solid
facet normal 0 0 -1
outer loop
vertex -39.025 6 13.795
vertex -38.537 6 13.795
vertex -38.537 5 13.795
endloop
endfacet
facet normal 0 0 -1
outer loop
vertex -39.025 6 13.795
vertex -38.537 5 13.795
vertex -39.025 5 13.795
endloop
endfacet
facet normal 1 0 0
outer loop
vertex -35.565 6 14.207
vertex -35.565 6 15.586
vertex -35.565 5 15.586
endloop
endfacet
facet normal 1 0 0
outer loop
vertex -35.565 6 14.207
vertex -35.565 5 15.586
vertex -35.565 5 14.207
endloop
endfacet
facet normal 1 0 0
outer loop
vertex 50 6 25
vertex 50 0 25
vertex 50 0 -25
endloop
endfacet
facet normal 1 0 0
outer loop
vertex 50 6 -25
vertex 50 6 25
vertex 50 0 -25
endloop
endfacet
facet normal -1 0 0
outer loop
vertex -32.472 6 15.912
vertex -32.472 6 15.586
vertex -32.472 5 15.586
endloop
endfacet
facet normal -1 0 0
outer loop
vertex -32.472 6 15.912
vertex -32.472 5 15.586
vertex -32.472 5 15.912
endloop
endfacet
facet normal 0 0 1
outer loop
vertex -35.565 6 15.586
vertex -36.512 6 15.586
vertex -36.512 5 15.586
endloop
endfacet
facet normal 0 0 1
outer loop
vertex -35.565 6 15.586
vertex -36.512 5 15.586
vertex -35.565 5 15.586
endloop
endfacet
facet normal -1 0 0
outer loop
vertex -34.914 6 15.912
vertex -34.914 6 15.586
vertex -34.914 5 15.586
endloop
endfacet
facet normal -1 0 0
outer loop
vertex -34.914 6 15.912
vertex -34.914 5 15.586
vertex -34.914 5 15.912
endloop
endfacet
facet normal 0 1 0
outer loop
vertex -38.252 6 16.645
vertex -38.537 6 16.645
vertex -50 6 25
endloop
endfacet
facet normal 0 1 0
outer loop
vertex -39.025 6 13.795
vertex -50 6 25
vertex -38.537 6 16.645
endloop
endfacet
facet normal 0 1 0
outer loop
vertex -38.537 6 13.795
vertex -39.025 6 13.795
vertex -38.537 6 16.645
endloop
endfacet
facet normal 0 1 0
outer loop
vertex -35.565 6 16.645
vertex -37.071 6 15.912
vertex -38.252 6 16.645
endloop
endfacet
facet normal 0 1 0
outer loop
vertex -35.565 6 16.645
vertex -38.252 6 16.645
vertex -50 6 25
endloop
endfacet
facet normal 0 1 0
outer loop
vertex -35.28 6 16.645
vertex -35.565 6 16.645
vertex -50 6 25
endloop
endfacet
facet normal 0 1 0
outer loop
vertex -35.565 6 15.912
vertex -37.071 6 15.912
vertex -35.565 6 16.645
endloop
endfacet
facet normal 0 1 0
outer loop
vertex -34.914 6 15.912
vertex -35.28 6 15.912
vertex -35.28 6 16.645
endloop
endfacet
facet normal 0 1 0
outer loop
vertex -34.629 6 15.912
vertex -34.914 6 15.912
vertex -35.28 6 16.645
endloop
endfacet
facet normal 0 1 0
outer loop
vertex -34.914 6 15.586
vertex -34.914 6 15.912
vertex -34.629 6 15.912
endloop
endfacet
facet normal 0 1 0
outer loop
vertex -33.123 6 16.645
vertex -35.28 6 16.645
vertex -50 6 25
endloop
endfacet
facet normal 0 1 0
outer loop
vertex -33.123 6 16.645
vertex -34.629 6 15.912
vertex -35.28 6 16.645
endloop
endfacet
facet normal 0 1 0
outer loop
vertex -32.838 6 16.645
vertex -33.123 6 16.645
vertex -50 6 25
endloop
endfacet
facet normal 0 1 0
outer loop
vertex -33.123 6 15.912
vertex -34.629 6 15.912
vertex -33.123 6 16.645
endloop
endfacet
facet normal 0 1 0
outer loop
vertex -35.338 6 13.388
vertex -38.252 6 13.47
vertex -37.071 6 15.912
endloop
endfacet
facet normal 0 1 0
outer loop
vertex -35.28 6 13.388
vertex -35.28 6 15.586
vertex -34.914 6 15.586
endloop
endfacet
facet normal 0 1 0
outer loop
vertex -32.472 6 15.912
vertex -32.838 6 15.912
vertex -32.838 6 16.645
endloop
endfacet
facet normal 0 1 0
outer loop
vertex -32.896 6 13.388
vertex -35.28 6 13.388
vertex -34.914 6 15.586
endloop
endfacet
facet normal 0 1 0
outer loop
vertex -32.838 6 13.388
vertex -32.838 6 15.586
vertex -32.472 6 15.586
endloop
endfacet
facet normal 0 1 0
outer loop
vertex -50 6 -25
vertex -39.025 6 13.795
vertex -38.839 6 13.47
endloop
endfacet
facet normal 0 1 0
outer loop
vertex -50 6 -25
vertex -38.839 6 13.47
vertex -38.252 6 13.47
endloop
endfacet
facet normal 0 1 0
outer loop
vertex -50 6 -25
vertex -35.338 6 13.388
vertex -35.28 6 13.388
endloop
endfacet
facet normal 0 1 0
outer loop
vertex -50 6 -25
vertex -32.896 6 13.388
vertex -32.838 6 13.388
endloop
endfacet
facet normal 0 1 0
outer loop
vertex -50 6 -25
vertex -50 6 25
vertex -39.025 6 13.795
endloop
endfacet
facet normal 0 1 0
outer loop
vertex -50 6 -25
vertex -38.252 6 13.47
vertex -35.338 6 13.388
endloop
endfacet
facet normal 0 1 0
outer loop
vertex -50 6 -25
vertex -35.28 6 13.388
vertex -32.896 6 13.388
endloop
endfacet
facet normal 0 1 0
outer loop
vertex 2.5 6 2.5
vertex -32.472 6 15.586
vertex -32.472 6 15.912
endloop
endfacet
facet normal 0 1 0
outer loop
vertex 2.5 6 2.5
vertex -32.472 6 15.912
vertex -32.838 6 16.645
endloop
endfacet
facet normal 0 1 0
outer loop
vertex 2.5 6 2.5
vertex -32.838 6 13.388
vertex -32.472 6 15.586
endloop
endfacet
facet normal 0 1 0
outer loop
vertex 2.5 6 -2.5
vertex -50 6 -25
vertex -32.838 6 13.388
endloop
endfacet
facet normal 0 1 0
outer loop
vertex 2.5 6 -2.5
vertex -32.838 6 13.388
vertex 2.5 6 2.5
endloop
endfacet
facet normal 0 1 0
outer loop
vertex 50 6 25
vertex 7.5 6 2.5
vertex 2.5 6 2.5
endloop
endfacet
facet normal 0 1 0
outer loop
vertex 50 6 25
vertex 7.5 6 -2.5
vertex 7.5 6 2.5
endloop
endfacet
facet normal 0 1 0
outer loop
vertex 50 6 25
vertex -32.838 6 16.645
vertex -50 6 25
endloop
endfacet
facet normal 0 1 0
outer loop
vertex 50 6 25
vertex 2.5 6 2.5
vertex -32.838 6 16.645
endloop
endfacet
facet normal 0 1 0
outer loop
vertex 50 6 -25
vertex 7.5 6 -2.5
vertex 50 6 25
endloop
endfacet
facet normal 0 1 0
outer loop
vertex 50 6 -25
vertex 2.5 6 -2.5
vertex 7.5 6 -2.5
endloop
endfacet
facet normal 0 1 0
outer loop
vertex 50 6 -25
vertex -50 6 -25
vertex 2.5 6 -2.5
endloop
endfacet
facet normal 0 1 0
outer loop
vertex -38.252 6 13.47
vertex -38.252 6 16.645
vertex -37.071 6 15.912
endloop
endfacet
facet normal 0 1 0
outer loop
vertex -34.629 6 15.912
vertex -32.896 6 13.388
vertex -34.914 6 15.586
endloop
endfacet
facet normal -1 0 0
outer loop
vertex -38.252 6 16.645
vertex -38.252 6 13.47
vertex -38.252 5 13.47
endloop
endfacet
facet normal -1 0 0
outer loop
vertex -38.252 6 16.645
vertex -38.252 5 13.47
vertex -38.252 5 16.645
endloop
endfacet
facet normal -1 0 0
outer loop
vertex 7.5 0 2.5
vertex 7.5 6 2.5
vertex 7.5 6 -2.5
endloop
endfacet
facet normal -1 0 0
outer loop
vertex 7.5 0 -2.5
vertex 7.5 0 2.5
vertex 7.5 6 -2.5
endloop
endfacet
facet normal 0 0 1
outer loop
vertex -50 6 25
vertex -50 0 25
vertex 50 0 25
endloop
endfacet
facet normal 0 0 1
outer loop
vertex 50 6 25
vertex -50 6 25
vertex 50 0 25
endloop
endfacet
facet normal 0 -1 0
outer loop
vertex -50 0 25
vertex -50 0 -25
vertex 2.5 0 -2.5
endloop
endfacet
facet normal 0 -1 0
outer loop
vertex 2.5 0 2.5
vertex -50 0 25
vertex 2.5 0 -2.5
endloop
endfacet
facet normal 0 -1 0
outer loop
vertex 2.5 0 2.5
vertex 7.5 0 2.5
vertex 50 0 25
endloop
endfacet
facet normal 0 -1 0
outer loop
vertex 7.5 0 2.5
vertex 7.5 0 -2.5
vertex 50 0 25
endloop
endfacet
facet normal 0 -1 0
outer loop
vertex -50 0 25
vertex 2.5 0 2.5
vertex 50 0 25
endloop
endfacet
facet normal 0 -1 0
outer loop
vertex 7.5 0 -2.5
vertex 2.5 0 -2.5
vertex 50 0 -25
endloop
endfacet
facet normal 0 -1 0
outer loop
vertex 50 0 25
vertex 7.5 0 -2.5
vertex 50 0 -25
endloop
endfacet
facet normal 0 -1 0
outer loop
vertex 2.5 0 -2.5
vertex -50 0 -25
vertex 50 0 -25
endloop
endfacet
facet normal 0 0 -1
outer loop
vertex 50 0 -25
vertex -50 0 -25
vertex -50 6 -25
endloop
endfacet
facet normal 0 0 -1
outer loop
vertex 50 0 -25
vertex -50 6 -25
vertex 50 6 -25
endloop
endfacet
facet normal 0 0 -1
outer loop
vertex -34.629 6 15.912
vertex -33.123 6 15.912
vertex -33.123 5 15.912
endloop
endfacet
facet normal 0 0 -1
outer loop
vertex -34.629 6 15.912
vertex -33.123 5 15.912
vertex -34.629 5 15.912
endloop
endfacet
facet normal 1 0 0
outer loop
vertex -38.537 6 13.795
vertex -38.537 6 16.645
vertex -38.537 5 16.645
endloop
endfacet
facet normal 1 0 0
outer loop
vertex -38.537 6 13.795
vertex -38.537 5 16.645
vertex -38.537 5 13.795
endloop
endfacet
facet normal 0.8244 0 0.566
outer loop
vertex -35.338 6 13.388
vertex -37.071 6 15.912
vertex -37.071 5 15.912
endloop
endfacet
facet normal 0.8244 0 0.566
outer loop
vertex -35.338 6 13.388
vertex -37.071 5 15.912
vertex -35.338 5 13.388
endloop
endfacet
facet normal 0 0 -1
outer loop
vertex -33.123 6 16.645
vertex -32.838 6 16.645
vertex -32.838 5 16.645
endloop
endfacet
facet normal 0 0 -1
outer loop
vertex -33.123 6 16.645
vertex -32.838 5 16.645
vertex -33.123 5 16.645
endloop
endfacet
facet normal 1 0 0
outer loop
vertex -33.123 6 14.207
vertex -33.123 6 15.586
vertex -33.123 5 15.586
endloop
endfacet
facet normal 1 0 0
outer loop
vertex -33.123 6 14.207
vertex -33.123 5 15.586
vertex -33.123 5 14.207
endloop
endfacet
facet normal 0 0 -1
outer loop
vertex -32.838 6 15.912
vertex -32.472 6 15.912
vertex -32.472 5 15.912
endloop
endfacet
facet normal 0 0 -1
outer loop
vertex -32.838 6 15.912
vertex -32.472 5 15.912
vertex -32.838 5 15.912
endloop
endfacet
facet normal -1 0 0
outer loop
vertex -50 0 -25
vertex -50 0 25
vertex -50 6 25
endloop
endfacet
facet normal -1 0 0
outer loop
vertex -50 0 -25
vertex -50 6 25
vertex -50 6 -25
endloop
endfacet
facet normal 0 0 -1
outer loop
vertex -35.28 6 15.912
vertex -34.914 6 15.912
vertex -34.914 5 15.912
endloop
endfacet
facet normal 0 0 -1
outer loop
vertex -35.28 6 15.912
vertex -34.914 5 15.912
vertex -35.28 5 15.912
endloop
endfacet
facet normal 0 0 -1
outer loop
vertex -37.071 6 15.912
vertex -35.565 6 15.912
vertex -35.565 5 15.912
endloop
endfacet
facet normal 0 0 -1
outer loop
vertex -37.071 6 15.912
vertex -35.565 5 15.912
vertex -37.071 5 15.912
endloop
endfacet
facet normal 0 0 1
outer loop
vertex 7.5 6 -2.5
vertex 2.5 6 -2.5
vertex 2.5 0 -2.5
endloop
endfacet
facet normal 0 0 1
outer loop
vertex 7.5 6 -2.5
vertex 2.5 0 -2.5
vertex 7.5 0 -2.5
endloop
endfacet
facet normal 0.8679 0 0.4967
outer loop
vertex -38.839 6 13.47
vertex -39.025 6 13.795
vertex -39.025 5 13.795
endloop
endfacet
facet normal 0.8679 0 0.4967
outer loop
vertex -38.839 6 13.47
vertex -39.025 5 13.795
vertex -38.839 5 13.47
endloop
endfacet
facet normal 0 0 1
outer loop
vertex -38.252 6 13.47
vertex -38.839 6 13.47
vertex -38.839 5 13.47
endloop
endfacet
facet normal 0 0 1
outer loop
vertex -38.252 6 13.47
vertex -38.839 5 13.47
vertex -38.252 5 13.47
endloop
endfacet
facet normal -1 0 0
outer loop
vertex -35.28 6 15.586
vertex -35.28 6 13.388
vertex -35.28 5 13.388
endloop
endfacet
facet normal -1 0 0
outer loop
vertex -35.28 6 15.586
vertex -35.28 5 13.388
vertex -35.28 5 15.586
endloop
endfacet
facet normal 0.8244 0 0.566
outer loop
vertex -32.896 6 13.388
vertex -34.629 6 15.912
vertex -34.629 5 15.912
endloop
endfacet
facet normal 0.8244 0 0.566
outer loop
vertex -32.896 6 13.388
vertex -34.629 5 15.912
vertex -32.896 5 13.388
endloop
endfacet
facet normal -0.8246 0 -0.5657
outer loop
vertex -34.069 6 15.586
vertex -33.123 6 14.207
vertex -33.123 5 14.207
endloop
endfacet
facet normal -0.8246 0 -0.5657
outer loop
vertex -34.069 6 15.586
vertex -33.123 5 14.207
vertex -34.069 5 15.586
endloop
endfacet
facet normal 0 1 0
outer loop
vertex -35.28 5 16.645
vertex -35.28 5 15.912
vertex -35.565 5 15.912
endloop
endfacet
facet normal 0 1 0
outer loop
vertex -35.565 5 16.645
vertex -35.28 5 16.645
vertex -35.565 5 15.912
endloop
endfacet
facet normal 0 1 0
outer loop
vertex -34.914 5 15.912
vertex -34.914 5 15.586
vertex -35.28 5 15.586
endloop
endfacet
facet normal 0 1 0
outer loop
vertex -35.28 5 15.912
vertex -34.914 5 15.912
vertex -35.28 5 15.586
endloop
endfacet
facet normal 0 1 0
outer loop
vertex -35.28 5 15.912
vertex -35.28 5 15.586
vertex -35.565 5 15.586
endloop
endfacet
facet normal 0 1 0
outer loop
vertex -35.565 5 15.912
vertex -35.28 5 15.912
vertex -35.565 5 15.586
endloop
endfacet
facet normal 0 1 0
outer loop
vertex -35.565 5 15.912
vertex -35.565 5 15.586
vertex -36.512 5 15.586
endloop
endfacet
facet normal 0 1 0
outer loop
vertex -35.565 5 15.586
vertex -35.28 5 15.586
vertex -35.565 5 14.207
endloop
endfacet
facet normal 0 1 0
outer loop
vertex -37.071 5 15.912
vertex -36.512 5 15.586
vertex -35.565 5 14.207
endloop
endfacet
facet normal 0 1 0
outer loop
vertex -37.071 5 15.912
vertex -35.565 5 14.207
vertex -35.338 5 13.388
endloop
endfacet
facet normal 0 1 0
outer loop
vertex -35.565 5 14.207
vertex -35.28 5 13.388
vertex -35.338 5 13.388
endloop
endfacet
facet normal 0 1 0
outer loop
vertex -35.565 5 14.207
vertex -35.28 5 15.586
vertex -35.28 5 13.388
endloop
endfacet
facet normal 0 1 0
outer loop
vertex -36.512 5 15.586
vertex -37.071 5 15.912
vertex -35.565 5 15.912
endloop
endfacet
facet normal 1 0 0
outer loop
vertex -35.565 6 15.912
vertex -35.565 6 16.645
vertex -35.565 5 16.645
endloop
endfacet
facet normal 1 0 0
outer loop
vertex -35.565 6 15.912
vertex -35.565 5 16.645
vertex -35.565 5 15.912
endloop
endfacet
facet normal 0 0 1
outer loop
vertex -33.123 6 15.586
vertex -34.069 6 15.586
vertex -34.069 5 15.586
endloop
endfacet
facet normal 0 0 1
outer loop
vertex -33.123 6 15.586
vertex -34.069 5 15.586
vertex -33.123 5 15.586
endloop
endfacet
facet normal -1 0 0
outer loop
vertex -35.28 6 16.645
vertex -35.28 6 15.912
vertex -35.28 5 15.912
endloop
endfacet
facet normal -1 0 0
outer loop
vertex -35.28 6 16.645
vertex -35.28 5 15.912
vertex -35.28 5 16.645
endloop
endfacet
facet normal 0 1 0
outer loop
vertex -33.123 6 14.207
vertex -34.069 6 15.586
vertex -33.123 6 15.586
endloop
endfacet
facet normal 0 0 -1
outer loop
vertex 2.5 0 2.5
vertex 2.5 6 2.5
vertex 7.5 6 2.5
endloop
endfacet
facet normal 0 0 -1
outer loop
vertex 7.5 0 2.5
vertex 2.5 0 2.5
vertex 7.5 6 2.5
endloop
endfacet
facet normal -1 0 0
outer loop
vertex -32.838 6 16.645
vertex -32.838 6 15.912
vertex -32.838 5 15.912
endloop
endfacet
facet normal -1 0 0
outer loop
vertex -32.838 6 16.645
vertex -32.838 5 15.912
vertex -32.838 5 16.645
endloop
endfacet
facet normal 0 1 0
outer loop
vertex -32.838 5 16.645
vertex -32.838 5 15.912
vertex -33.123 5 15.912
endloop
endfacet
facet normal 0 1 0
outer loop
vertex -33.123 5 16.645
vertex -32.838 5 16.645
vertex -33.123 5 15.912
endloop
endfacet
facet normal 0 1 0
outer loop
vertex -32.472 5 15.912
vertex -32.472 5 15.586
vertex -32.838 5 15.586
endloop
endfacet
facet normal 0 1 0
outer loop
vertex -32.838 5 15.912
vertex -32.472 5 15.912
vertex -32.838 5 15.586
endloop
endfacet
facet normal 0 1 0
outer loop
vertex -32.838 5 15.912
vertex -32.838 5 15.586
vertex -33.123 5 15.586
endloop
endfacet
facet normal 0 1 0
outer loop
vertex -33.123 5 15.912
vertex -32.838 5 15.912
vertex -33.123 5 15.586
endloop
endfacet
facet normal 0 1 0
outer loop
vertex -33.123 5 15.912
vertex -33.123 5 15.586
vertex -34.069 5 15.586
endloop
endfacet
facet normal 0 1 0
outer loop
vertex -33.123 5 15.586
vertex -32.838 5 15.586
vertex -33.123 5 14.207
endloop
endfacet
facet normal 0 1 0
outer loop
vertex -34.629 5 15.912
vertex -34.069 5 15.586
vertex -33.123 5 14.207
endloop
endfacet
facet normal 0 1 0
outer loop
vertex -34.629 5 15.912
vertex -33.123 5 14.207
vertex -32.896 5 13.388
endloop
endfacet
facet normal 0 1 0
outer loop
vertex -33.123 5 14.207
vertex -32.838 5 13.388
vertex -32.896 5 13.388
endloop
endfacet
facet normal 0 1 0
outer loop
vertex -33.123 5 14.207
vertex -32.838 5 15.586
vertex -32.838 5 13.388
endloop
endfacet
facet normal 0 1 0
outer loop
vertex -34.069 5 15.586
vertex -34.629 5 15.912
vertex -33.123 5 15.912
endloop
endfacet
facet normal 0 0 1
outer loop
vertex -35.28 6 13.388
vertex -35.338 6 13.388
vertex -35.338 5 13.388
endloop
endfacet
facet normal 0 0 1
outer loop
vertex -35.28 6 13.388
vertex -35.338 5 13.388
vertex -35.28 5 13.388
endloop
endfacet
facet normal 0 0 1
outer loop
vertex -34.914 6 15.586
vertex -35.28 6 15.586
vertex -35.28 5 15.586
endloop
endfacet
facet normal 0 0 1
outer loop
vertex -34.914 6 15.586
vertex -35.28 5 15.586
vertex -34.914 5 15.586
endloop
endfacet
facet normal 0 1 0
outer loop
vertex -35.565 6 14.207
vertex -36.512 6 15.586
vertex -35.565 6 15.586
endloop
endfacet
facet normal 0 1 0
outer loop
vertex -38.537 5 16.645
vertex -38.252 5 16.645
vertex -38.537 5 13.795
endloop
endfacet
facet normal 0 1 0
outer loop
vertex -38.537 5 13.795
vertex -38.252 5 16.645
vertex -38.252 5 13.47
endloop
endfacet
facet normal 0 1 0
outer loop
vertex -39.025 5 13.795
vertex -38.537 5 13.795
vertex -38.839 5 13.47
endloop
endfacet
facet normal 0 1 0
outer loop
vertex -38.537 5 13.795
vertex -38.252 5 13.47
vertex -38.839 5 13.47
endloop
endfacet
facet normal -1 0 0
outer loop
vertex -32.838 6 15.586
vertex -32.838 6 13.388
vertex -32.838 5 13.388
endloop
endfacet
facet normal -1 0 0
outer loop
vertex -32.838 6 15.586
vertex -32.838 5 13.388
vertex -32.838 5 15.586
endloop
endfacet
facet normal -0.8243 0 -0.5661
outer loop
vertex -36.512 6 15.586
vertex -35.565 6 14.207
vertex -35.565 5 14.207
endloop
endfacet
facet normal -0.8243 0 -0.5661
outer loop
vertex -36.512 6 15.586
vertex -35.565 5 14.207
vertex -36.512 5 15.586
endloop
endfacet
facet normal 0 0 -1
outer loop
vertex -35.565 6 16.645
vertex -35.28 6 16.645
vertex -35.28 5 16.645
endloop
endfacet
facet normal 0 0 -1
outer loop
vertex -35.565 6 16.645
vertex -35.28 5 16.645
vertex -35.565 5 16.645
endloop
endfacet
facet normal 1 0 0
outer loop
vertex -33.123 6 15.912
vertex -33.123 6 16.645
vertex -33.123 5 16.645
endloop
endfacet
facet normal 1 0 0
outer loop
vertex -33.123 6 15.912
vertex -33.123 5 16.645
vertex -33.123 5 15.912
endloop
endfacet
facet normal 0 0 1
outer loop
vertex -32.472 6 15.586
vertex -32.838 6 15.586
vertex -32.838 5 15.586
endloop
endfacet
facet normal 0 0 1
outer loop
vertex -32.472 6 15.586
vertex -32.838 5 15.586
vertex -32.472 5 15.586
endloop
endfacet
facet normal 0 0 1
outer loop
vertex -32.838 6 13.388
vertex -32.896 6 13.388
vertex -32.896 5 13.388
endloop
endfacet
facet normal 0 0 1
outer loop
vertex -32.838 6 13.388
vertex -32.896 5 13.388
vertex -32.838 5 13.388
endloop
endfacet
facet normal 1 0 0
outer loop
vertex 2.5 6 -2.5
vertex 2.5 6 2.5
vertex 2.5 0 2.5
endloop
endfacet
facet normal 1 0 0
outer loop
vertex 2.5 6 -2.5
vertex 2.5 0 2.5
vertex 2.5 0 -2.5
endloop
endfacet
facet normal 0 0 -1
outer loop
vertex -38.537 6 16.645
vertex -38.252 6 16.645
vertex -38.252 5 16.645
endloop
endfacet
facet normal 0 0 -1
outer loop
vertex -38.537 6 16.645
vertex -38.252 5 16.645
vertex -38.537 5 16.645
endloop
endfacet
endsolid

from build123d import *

# Parameters (mm, degrees)
SKETCH1_W           = 100
SKETCH1_H           = 50
BOSS_EXTRUDE1_DEPTH = 6
SKETCH2_W           = 5
SKETCH2_H           = 5
CUT_EXTRUDE1_DEPTH  = 6
CUT_EXTRUDE2_DEPTH  = 1


with BuildPart() as part:
    # Sketch1 → Boss-Extrude1 (new body)
    with BuildSketch(Plane(origin=(0, 0, 0), x_dir=(1, 0, 0), z_dir=(0, 1, 0))):
        Rectangle(SKETCH1_W, SKETCH1_H)
    extrude(amount=BOSS_EXTRUDE1_DEPTH)

    # Sketch2 → Cut-Extrude1 (cut)
    with BuildSketch(Plane(origin=(0, 6, 0), x_dir=(1, 0, 0), z_dir=(0, 1, 0))):
        with Locations((5, 0)):
            Rectangle(SKETCH2_W, SKETCH2_H)
    extrude(amount=-CUT_EXTRUDE1_DEPTH, mode=Mode.SUBTRACT)

    # Sketch3 → Cut-Extrude2 (cut)
    # profile 1 of 3: a face of its own
    with BuildSketch(Plane(origin=(0, 6, 0), x_dir=(1, 0, 0), z_dir=(0, 1, 0))):
        Polygon((-38.838837881, -13.469581545), (-38.25179361, -13.469581545), (-38.25179361, -16.644581545), (-38.536729508, -16.644581545), (-38.536729508, -13.795222571), (-39.025191046, -13.795222571), align=None)
    # profile 2 of 3: a face of its own
    with BuildSketch(Plane(origin=(0, 6, 0), x_dir=(1, 0, 0), z_dir=(0, 1, 0))):
        Polygon((-35.338196855, -13.388171289), (-35.280319251, -13.388171289), (-35.280319251, -15.586248212), (-34.913973097, -15.586248212), (-34.913973097, -15.911889237), (-35.280319251, -15.911889237), (-35.280319251, -16.644581545), (-35.565255149, -16.644581545), (-35.565255149, -15.911889237), (-37.071344892, -15.911889237), align=None)
        Polygon((-35.565255149, -15.586248212), (-35.565255149, -14.207361994), (-36.511649379, -15.586248212), align=None, mode=Mode.SUBTRACT)
    # profile 3 of 3: a face of its own
    with BuildSketch(Plane(origin=(0, 6, 0), x_dir=(1, 0, 0), z_dir=(0, 1, 0))):
        Polygon((-32.895889163, -13.388171289), (-32.838011559, -13.388171289), (-32.838011559, -15.586248212), (-32.471665405, -15.586248212), (-32.471665405, -15.911889237), (-32.838011559, -15.911889237), (-32.838011559, -16.644581545), (-33.122947456, -16.644581545), (-33.122947456, -15.911889237), (-34.6290372, -15.911889237), align=None)
        Polygon((-33.122947456, -15.586248212), (-33.122947456, -14.207361994), (-34.069341687, -15.586248212), align=None, mode=Mode.SUBTRACT)
    extrude(amount=-CUT_EXTRUDE2_DEPTH, mode=Mode.SUBTRACT)


solid = part.part
